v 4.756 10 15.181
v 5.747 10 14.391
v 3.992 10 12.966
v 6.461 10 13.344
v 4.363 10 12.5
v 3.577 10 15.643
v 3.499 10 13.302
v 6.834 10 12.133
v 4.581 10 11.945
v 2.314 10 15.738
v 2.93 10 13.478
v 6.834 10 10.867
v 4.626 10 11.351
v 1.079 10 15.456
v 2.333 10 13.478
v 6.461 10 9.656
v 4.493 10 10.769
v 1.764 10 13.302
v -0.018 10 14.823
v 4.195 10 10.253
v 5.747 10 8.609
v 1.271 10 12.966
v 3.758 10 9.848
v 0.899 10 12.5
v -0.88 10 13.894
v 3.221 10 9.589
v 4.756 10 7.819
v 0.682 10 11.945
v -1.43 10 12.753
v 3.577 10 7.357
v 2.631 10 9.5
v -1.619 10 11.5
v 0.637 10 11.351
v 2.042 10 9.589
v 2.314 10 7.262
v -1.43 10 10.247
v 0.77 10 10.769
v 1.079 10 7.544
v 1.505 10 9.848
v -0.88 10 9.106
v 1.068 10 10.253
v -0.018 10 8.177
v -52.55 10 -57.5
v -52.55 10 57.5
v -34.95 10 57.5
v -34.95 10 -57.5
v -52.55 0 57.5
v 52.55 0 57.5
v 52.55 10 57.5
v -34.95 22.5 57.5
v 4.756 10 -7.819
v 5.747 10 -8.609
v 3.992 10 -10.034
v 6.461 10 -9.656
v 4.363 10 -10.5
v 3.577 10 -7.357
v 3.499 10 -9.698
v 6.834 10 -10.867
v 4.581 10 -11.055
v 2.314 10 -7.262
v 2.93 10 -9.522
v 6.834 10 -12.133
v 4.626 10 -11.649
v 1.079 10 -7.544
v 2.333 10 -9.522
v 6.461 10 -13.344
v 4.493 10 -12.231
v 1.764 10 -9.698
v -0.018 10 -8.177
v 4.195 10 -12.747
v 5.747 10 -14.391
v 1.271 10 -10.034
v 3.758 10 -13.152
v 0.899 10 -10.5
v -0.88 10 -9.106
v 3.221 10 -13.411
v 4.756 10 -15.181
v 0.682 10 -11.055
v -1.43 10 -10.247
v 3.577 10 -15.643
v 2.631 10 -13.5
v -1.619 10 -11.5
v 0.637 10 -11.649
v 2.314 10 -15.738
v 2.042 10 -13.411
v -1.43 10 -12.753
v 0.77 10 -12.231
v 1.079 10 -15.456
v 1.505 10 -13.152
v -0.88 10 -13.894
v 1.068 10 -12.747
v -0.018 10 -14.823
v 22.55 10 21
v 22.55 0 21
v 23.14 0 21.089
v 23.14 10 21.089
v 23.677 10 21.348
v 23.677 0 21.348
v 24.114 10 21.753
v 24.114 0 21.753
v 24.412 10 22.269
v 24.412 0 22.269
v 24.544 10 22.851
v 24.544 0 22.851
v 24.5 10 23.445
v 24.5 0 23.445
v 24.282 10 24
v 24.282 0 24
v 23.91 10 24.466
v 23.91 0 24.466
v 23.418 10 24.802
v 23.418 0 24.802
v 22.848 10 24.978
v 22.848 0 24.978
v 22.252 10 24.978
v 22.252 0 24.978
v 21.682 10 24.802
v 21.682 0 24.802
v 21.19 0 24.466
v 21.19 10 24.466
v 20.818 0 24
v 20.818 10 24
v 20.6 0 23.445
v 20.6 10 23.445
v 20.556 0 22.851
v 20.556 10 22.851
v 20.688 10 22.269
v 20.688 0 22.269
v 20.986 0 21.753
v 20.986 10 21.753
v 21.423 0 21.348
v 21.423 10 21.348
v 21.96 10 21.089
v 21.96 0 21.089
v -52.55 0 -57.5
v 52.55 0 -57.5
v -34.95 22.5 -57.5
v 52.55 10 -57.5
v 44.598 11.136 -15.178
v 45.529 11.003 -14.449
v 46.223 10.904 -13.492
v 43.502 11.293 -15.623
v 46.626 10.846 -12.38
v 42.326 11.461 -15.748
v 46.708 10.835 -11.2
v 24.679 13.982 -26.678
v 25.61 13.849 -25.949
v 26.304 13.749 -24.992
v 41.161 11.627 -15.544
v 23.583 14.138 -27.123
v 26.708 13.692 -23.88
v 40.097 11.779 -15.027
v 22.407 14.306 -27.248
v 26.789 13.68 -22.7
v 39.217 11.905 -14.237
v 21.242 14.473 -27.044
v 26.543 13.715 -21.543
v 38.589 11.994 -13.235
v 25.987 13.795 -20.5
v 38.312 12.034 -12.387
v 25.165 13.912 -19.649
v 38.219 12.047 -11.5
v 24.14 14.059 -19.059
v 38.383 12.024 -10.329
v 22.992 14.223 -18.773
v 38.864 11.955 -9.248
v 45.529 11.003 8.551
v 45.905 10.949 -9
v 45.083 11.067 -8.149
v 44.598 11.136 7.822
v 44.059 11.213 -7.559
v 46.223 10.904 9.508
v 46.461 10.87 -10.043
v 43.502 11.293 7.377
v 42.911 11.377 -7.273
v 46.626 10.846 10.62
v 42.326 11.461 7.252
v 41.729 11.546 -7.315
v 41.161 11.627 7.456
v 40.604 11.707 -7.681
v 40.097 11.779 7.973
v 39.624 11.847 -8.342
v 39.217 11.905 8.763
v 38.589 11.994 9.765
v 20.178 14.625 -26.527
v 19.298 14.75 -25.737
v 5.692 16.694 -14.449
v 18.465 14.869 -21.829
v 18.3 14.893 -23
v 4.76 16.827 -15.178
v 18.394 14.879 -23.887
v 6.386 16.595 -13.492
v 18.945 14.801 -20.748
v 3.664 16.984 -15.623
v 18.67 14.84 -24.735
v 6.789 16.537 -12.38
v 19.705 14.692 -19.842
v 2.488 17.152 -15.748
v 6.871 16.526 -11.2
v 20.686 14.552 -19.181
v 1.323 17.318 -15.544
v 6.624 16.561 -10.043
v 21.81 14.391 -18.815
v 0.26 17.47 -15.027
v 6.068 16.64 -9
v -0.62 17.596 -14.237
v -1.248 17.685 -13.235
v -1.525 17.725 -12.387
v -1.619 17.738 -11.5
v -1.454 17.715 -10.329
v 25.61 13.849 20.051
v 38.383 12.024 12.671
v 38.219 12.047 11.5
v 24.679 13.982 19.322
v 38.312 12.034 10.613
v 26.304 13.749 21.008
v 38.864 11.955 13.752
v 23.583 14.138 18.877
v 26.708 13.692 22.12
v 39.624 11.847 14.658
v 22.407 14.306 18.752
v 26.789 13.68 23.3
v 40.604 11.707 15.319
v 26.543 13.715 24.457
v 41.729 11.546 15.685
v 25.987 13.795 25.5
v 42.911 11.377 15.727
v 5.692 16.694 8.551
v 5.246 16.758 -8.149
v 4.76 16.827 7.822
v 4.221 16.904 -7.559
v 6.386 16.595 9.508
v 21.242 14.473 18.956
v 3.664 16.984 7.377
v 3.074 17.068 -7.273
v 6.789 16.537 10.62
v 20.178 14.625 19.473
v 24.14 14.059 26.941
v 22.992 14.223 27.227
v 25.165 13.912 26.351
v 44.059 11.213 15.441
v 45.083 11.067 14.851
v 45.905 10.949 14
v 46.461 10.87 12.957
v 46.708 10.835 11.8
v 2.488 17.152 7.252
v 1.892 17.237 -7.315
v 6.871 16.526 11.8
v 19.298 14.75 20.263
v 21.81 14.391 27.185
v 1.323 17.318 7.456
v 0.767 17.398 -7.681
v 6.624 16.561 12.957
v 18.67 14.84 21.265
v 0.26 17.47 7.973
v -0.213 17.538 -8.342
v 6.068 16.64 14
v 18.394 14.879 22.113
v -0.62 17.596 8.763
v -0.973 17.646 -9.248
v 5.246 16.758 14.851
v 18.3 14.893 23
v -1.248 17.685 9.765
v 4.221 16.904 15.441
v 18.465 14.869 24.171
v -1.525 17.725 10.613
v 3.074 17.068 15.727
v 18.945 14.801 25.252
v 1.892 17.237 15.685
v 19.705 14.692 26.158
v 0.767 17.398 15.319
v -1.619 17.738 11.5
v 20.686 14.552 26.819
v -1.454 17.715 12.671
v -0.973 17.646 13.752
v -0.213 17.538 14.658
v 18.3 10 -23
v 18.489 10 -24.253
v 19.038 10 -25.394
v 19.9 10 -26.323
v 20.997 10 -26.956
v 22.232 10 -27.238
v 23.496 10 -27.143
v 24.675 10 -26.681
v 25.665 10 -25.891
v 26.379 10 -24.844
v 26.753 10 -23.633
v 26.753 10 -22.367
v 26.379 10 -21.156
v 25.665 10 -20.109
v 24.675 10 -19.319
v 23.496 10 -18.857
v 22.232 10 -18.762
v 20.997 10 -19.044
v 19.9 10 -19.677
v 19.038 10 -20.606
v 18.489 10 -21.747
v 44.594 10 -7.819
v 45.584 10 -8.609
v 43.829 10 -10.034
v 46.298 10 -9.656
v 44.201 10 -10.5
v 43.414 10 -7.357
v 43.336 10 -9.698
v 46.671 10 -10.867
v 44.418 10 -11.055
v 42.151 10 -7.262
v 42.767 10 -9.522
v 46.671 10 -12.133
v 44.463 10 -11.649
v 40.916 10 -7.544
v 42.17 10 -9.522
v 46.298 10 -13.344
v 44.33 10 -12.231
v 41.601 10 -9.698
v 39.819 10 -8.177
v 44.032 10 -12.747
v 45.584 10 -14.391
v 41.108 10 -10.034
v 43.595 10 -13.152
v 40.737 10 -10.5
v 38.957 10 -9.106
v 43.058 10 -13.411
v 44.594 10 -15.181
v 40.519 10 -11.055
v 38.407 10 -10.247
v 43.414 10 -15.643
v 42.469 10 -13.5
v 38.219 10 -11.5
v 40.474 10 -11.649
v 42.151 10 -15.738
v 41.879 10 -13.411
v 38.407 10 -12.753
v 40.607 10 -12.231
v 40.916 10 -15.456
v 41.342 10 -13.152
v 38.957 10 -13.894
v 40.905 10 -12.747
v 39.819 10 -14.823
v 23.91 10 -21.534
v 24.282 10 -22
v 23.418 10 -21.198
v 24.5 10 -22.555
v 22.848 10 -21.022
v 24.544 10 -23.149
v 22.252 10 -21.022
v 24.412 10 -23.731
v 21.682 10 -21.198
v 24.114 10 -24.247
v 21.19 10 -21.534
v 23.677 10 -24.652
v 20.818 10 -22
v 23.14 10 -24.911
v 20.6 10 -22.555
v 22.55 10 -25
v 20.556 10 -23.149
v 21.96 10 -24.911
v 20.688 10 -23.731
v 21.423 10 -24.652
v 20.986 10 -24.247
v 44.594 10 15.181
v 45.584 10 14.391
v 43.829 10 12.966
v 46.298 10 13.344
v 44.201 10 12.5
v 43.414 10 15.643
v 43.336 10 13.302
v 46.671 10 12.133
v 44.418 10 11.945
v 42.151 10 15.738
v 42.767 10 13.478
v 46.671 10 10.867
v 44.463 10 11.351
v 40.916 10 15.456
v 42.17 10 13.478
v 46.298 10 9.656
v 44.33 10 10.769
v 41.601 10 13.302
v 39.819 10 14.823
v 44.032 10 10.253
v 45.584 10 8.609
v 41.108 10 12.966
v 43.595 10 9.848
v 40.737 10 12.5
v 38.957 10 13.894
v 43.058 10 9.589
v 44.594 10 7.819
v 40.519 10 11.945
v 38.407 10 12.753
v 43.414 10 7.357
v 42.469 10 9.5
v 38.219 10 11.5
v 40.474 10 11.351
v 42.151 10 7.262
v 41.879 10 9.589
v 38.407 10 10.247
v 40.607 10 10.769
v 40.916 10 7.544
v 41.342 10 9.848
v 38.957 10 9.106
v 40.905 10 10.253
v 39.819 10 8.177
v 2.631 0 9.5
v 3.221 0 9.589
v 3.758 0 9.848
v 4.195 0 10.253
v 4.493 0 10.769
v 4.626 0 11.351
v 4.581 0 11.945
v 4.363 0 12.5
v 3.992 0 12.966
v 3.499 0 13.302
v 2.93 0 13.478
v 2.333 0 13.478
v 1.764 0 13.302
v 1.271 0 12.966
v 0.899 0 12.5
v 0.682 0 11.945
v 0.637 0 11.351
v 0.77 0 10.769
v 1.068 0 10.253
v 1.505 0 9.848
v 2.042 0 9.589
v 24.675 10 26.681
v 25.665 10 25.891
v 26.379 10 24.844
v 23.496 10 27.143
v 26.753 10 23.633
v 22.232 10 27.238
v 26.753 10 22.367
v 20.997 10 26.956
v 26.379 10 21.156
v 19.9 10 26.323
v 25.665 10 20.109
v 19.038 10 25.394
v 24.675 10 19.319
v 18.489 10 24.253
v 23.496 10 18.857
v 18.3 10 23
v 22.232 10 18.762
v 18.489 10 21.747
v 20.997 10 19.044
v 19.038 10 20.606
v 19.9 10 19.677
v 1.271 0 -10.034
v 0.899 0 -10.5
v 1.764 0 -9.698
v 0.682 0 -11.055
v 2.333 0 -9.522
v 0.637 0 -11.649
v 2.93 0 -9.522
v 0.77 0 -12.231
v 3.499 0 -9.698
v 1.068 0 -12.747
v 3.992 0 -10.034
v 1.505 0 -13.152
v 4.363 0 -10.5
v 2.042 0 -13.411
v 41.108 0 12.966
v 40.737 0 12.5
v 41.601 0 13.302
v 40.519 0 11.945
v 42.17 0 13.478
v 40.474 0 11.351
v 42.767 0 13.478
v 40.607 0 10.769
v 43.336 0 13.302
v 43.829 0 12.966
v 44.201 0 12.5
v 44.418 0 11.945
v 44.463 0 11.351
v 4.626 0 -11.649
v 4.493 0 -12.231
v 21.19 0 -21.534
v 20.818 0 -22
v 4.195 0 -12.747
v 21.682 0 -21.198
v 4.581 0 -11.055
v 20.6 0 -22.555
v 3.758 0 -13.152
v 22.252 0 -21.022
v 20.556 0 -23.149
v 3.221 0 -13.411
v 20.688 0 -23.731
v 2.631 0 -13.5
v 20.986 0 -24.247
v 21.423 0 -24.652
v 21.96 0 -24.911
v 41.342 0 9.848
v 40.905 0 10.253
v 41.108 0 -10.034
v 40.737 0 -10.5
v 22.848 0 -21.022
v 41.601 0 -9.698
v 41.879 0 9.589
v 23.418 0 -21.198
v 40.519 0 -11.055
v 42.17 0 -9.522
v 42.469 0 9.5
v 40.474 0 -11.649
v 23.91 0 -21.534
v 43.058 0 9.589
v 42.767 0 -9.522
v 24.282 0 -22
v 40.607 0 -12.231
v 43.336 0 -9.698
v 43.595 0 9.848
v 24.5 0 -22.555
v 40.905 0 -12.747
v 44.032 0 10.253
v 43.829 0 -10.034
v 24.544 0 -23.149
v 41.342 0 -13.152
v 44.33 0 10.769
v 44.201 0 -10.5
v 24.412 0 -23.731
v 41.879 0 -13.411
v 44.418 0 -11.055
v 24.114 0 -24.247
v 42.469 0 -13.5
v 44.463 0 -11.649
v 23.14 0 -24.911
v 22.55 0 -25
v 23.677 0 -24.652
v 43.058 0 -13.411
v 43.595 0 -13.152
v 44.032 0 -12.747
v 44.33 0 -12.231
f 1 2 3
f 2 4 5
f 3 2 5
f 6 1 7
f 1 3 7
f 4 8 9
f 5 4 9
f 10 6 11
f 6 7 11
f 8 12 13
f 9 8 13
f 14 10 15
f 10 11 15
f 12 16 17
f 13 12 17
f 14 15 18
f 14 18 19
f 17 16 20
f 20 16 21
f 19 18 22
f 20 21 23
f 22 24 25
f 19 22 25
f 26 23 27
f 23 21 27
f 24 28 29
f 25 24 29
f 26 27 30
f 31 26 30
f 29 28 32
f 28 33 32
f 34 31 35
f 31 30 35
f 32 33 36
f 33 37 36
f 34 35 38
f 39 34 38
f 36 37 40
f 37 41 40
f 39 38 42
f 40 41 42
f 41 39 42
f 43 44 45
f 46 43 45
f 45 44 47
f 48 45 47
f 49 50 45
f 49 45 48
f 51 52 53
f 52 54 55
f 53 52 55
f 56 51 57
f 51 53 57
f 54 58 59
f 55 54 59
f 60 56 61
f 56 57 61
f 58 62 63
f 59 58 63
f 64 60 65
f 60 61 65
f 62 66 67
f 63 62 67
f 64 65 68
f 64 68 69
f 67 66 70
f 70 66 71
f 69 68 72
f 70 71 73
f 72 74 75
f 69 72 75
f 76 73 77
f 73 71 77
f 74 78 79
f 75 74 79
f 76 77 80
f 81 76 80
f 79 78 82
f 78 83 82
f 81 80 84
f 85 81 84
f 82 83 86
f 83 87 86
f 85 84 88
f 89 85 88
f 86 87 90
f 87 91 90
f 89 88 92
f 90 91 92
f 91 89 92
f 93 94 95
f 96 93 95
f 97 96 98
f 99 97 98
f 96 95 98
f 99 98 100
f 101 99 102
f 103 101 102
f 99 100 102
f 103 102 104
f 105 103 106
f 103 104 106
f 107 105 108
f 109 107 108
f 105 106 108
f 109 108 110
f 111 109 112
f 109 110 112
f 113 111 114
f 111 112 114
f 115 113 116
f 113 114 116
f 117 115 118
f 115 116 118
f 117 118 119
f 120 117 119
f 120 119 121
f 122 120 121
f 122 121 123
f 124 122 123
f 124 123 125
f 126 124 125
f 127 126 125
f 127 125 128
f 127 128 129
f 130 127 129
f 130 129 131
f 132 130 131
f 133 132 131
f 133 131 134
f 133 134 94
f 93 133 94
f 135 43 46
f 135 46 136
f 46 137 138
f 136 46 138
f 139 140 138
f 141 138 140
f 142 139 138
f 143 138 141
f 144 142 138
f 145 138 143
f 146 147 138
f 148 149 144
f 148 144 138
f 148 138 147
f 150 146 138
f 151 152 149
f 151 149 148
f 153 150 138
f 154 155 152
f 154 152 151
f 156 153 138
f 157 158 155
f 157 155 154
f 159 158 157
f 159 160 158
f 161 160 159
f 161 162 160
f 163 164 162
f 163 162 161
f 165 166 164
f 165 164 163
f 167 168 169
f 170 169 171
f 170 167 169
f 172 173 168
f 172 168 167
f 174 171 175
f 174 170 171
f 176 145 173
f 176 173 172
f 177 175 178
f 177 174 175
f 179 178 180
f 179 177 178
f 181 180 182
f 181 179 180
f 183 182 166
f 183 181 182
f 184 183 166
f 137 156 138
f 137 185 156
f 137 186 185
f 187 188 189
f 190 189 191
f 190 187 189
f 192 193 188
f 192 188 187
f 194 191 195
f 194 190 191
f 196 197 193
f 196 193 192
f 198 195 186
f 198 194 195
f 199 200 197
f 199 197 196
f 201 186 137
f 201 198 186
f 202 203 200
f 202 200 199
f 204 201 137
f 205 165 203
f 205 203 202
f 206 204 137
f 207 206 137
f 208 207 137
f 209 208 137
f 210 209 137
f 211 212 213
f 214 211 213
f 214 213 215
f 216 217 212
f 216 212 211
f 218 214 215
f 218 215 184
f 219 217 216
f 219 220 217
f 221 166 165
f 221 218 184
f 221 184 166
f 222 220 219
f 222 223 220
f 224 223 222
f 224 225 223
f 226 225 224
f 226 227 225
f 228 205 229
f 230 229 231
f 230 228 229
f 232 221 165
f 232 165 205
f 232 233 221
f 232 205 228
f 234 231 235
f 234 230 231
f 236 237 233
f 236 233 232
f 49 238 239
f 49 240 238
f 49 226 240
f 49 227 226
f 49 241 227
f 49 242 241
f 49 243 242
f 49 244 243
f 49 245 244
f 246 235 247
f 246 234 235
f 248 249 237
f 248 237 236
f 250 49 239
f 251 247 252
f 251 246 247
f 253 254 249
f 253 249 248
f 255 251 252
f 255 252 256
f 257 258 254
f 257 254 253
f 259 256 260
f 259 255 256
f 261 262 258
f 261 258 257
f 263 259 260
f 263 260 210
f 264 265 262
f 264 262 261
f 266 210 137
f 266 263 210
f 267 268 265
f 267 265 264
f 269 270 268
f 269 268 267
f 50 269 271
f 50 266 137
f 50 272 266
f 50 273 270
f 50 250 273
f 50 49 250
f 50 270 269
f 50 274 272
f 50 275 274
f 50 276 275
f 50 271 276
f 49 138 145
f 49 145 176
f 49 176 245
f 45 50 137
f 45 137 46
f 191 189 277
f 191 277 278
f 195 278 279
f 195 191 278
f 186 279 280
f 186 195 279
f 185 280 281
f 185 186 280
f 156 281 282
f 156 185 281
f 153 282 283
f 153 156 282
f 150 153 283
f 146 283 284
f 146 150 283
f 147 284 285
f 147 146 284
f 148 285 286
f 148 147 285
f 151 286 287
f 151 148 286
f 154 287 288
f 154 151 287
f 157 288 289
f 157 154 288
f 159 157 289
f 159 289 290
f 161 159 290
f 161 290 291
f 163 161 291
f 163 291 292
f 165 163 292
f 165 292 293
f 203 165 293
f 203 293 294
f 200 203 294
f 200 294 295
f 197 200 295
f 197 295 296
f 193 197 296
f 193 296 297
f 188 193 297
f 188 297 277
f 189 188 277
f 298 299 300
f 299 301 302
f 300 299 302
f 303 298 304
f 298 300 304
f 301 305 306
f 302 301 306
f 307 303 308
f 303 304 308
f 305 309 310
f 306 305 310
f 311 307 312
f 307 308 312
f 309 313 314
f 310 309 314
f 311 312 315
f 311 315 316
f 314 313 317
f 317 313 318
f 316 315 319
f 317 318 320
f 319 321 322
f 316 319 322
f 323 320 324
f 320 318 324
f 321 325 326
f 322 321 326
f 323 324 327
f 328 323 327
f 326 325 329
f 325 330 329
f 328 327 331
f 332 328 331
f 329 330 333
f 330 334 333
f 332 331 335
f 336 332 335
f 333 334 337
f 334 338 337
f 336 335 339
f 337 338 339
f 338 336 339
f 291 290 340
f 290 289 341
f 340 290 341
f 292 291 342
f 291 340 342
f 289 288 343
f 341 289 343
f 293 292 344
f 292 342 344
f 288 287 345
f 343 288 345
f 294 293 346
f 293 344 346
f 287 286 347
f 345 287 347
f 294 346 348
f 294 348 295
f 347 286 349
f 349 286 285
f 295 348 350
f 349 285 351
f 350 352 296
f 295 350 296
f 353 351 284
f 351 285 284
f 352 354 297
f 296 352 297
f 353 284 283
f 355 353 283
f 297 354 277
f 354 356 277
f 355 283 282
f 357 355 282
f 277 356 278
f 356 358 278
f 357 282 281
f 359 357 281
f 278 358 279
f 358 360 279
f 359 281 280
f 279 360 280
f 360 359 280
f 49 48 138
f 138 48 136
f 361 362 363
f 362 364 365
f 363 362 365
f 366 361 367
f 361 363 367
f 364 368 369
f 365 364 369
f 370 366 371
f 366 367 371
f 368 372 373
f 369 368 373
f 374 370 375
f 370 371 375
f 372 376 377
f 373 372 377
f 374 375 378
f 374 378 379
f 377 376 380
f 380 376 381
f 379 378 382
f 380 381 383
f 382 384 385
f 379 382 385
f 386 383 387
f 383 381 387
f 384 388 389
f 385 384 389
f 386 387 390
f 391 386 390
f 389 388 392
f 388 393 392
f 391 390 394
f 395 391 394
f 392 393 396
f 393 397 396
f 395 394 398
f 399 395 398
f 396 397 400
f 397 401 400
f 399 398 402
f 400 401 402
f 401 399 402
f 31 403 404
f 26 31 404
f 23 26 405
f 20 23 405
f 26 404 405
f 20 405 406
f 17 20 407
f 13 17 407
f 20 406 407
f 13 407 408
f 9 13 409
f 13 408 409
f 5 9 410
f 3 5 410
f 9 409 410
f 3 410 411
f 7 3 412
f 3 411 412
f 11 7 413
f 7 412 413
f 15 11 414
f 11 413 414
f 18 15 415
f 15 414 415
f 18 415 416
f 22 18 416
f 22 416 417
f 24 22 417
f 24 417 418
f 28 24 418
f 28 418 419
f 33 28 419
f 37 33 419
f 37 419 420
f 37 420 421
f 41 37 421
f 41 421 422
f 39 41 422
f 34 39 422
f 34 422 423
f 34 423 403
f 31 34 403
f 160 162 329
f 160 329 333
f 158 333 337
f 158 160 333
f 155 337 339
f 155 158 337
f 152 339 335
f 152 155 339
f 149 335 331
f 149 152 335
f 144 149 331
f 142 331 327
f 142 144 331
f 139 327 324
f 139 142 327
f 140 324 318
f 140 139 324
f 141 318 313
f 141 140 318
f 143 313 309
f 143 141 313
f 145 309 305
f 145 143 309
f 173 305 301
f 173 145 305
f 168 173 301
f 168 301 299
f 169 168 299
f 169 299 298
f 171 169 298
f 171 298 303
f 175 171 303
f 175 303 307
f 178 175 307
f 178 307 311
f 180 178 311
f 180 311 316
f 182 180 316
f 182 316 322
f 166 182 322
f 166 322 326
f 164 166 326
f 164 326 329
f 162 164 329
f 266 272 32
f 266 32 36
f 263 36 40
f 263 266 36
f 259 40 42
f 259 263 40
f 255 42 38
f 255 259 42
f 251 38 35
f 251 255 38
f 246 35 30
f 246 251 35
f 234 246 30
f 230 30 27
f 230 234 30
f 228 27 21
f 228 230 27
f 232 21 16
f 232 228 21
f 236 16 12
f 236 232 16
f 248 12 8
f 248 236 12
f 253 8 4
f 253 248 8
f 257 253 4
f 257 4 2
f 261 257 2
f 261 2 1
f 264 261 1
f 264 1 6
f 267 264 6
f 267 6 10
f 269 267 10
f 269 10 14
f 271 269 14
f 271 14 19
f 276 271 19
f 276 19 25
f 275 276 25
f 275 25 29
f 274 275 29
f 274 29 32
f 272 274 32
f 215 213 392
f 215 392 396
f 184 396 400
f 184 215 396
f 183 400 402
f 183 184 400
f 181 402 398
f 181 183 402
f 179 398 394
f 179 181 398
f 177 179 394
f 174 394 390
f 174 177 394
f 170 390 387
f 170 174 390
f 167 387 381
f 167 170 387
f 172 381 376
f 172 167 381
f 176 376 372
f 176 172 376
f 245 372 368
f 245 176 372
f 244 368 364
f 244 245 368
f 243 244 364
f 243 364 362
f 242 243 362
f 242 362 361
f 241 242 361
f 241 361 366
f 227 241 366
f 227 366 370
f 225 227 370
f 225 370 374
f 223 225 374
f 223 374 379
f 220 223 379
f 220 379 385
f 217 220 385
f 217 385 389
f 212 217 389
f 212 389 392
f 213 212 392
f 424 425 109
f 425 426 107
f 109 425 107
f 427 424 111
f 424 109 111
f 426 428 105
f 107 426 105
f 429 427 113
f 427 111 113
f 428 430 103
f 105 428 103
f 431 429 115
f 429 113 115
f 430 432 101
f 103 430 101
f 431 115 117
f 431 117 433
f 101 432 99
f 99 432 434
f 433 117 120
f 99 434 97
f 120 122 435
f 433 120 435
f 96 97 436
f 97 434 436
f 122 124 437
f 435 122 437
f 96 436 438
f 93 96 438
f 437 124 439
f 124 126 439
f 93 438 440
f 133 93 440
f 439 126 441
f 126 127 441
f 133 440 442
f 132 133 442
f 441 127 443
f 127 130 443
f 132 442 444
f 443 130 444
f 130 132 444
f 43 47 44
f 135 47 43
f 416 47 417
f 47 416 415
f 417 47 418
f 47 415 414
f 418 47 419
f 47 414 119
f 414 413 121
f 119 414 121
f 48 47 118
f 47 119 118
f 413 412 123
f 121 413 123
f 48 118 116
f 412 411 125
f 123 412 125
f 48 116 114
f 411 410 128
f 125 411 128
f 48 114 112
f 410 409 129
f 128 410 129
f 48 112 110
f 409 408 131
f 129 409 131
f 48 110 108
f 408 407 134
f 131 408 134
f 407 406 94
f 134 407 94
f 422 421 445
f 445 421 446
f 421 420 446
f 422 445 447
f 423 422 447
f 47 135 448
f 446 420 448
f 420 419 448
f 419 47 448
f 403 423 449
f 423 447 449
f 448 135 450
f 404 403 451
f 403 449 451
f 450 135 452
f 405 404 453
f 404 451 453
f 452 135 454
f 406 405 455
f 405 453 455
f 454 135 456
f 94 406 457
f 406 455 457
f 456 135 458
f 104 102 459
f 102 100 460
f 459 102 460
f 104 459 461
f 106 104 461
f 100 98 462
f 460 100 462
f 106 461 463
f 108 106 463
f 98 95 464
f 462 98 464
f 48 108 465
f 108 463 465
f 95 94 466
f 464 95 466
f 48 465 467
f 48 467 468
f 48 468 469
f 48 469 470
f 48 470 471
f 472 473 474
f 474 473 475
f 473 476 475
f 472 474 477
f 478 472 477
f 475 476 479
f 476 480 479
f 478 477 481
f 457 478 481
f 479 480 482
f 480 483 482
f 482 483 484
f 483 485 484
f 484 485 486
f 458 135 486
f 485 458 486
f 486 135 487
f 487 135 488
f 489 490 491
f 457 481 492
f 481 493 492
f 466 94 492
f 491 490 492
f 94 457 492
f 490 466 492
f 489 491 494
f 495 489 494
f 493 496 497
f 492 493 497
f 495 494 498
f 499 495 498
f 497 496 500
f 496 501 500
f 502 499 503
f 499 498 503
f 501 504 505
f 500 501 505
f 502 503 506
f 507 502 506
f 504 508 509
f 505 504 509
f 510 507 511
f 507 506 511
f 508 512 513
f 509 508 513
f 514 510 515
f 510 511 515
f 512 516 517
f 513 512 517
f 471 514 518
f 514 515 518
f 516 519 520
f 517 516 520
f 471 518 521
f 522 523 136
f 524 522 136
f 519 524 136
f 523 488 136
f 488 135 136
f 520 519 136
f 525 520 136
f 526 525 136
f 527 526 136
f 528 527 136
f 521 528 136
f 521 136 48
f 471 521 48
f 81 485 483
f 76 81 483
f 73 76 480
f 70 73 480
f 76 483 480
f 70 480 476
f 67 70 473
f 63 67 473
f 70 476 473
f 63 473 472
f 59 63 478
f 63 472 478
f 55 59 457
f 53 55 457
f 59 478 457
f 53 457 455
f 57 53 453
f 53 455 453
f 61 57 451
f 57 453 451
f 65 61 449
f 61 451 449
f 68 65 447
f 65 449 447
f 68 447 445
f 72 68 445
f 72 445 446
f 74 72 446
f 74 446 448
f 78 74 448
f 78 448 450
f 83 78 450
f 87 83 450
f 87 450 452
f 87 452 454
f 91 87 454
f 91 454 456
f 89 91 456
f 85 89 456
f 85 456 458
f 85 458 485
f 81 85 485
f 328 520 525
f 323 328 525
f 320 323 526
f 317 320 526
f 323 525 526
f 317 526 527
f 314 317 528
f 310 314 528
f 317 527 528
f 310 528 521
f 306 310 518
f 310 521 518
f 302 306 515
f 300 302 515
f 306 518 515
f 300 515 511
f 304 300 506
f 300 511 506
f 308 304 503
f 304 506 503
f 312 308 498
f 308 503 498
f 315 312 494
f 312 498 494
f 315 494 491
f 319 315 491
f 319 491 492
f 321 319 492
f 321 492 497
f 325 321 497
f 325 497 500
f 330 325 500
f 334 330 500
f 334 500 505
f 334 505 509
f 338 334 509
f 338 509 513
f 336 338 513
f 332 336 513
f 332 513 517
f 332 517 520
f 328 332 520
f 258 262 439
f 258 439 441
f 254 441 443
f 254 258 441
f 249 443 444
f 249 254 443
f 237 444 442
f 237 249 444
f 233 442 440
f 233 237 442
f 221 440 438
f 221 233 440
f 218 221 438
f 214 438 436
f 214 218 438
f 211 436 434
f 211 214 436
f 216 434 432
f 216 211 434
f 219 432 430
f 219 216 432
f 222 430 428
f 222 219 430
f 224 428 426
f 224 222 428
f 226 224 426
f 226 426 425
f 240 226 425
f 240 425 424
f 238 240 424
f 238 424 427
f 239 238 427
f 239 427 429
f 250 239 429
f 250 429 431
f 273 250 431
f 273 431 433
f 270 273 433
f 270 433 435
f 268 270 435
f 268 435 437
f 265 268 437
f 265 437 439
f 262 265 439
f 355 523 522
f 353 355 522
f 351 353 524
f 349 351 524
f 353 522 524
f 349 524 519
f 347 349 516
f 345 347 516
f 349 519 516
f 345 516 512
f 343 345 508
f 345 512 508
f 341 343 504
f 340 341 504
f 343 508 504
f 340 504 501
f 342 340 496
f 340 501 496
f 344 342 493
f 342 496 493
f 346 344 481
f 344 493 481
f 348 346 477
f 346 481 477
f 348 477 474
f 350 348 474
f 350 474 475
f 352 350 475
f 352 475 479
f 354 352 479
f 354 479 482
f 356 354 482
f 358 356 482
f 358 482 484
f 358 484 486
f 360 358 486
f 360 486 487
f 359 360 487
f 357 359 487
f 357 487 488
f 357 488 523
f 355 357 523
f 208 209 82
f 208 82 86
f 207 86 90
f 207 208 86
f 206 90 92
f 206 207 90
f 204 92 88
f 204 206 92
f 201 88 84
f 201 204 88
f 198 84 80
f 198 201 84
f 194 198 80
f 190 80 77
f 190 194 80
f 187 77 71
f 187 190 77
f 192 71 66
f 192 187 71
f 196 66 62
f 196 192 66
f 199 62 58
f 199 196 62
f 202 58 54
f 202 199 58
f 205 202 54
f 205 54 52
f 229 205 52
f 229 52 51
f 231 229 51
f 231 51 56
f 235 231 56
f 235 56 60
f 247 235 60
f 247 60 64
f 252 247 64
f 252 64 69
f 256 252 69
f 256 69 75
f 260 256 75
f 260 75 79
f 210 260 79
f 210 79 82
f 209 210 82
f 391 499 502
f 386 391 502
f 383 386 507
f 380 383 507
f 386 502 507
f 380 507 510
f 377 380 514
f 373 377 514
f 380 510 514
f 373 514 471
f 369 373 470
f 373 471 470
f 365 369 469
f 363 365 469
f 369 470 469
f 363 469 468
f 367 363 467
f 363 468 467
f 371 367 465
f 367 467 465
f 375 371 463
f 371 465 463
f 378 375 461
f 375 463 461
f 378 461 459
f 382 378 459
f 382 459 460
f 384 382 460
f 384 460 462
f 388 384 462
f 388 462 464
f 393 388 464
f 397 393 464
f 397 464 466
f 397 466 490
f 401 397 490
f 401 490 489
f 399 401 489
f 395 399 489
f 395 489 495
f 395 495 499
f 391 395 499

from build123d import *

# Parameters (mm, degrees)
SKETCH1_W           = 105.1
SKETCH1_H           = 115
BOSS_EXTRUDE1_DEPTH = 10
BOSS_EXTRUDE2_DEPTH = 115
SKETCH2_R           = 2
CUT_EXTRUDE1_DEPTH  = 20
SKETCH4_R           = 4.25
CUT_EXTRUDE2_DEPTH  = 40


with BuildPart() as part:
    # Sketch1 → Boss-Extrude1 (new body)
    with BuildSketch(Plane(origin=(0, 0, 0), x_dir=(1, 0, 0), z_dir=(0, 1, 0))):
        Rectangle(SKETCH1_W, SKETCH1_H)
    extrude(amount=BOSS_EXTRUDE1_DEPTH)

    # Sketch3 → Boss-Extrude2 (add)
    with BuildSketch(Plane.XY.offset(57.5)):
        Polygon((-34.95, 10), (52.55, 10), (-34.95, 22.5), align=None)
    extrude(amount=-BOSS_EXTRUDE2_DEPTH)

    # Sketch2 → Cut-Extrude1 (cut)
    with BuildSketch(Plane.XZ):
        with Locations(Location((22.55, 23, 0), (0, 0, 270))):
            Circle(SKETCH2_R)
        with Locations(Location((2.631415713, 11.5, 0), (0, 0, 270))):
            Circle(SKETCH2_R)
        with Locations(Location((2.631415713, -11.5, 0), (0, 0, 270))):
            Circle(SKETCH2_R)
        with Locations(Location((22.55, -23, 0), (0, 0, 270))):
            Circle(SKETCH2_R)
        with Locations(Location((42.468584287, -11.5, 0), (0, 0, 270))):
            Circle(SKETCH2_R)
        with Locations(Location((42.468584287, 11.5, 0), (0, 0, 270))):
            Circle(SKETCH2_R)
    extrude(amount=-CUT_EXTRUDE1_DEPTH, mode=Mode.SUBTRACT)

    # Sketch4 → Cut-Extrude2 (cut)
    with BuildSketch(Plane(origin=(0, 50, 0), x_dir=(-1, 0, 0), z_dir=(0, -1, 0))):
        with Locations((-22.55, 23)):
            Circle(SKETCH4_R)
        with Locations((-2.631415713, 11.5)):
            Circle(SKETCH4_R)
        with Locations((-2.631415713, -11.5)):
            Circle(SKETCH4_R)
        with Locations((-22.55, -23)):
            Circle(SKETCH4_R)
        with Locations((-42.468584287, -11.5)):
            Circle(SKETCH4_R)
        with Locations((-42.468584287, 11.5)):
            Circle(SKETCH4_R)
    extrude(amount=CUT_EXTRUDE2_DEPTH, mode=Mode.SUBTRACT)


solid = part.part
